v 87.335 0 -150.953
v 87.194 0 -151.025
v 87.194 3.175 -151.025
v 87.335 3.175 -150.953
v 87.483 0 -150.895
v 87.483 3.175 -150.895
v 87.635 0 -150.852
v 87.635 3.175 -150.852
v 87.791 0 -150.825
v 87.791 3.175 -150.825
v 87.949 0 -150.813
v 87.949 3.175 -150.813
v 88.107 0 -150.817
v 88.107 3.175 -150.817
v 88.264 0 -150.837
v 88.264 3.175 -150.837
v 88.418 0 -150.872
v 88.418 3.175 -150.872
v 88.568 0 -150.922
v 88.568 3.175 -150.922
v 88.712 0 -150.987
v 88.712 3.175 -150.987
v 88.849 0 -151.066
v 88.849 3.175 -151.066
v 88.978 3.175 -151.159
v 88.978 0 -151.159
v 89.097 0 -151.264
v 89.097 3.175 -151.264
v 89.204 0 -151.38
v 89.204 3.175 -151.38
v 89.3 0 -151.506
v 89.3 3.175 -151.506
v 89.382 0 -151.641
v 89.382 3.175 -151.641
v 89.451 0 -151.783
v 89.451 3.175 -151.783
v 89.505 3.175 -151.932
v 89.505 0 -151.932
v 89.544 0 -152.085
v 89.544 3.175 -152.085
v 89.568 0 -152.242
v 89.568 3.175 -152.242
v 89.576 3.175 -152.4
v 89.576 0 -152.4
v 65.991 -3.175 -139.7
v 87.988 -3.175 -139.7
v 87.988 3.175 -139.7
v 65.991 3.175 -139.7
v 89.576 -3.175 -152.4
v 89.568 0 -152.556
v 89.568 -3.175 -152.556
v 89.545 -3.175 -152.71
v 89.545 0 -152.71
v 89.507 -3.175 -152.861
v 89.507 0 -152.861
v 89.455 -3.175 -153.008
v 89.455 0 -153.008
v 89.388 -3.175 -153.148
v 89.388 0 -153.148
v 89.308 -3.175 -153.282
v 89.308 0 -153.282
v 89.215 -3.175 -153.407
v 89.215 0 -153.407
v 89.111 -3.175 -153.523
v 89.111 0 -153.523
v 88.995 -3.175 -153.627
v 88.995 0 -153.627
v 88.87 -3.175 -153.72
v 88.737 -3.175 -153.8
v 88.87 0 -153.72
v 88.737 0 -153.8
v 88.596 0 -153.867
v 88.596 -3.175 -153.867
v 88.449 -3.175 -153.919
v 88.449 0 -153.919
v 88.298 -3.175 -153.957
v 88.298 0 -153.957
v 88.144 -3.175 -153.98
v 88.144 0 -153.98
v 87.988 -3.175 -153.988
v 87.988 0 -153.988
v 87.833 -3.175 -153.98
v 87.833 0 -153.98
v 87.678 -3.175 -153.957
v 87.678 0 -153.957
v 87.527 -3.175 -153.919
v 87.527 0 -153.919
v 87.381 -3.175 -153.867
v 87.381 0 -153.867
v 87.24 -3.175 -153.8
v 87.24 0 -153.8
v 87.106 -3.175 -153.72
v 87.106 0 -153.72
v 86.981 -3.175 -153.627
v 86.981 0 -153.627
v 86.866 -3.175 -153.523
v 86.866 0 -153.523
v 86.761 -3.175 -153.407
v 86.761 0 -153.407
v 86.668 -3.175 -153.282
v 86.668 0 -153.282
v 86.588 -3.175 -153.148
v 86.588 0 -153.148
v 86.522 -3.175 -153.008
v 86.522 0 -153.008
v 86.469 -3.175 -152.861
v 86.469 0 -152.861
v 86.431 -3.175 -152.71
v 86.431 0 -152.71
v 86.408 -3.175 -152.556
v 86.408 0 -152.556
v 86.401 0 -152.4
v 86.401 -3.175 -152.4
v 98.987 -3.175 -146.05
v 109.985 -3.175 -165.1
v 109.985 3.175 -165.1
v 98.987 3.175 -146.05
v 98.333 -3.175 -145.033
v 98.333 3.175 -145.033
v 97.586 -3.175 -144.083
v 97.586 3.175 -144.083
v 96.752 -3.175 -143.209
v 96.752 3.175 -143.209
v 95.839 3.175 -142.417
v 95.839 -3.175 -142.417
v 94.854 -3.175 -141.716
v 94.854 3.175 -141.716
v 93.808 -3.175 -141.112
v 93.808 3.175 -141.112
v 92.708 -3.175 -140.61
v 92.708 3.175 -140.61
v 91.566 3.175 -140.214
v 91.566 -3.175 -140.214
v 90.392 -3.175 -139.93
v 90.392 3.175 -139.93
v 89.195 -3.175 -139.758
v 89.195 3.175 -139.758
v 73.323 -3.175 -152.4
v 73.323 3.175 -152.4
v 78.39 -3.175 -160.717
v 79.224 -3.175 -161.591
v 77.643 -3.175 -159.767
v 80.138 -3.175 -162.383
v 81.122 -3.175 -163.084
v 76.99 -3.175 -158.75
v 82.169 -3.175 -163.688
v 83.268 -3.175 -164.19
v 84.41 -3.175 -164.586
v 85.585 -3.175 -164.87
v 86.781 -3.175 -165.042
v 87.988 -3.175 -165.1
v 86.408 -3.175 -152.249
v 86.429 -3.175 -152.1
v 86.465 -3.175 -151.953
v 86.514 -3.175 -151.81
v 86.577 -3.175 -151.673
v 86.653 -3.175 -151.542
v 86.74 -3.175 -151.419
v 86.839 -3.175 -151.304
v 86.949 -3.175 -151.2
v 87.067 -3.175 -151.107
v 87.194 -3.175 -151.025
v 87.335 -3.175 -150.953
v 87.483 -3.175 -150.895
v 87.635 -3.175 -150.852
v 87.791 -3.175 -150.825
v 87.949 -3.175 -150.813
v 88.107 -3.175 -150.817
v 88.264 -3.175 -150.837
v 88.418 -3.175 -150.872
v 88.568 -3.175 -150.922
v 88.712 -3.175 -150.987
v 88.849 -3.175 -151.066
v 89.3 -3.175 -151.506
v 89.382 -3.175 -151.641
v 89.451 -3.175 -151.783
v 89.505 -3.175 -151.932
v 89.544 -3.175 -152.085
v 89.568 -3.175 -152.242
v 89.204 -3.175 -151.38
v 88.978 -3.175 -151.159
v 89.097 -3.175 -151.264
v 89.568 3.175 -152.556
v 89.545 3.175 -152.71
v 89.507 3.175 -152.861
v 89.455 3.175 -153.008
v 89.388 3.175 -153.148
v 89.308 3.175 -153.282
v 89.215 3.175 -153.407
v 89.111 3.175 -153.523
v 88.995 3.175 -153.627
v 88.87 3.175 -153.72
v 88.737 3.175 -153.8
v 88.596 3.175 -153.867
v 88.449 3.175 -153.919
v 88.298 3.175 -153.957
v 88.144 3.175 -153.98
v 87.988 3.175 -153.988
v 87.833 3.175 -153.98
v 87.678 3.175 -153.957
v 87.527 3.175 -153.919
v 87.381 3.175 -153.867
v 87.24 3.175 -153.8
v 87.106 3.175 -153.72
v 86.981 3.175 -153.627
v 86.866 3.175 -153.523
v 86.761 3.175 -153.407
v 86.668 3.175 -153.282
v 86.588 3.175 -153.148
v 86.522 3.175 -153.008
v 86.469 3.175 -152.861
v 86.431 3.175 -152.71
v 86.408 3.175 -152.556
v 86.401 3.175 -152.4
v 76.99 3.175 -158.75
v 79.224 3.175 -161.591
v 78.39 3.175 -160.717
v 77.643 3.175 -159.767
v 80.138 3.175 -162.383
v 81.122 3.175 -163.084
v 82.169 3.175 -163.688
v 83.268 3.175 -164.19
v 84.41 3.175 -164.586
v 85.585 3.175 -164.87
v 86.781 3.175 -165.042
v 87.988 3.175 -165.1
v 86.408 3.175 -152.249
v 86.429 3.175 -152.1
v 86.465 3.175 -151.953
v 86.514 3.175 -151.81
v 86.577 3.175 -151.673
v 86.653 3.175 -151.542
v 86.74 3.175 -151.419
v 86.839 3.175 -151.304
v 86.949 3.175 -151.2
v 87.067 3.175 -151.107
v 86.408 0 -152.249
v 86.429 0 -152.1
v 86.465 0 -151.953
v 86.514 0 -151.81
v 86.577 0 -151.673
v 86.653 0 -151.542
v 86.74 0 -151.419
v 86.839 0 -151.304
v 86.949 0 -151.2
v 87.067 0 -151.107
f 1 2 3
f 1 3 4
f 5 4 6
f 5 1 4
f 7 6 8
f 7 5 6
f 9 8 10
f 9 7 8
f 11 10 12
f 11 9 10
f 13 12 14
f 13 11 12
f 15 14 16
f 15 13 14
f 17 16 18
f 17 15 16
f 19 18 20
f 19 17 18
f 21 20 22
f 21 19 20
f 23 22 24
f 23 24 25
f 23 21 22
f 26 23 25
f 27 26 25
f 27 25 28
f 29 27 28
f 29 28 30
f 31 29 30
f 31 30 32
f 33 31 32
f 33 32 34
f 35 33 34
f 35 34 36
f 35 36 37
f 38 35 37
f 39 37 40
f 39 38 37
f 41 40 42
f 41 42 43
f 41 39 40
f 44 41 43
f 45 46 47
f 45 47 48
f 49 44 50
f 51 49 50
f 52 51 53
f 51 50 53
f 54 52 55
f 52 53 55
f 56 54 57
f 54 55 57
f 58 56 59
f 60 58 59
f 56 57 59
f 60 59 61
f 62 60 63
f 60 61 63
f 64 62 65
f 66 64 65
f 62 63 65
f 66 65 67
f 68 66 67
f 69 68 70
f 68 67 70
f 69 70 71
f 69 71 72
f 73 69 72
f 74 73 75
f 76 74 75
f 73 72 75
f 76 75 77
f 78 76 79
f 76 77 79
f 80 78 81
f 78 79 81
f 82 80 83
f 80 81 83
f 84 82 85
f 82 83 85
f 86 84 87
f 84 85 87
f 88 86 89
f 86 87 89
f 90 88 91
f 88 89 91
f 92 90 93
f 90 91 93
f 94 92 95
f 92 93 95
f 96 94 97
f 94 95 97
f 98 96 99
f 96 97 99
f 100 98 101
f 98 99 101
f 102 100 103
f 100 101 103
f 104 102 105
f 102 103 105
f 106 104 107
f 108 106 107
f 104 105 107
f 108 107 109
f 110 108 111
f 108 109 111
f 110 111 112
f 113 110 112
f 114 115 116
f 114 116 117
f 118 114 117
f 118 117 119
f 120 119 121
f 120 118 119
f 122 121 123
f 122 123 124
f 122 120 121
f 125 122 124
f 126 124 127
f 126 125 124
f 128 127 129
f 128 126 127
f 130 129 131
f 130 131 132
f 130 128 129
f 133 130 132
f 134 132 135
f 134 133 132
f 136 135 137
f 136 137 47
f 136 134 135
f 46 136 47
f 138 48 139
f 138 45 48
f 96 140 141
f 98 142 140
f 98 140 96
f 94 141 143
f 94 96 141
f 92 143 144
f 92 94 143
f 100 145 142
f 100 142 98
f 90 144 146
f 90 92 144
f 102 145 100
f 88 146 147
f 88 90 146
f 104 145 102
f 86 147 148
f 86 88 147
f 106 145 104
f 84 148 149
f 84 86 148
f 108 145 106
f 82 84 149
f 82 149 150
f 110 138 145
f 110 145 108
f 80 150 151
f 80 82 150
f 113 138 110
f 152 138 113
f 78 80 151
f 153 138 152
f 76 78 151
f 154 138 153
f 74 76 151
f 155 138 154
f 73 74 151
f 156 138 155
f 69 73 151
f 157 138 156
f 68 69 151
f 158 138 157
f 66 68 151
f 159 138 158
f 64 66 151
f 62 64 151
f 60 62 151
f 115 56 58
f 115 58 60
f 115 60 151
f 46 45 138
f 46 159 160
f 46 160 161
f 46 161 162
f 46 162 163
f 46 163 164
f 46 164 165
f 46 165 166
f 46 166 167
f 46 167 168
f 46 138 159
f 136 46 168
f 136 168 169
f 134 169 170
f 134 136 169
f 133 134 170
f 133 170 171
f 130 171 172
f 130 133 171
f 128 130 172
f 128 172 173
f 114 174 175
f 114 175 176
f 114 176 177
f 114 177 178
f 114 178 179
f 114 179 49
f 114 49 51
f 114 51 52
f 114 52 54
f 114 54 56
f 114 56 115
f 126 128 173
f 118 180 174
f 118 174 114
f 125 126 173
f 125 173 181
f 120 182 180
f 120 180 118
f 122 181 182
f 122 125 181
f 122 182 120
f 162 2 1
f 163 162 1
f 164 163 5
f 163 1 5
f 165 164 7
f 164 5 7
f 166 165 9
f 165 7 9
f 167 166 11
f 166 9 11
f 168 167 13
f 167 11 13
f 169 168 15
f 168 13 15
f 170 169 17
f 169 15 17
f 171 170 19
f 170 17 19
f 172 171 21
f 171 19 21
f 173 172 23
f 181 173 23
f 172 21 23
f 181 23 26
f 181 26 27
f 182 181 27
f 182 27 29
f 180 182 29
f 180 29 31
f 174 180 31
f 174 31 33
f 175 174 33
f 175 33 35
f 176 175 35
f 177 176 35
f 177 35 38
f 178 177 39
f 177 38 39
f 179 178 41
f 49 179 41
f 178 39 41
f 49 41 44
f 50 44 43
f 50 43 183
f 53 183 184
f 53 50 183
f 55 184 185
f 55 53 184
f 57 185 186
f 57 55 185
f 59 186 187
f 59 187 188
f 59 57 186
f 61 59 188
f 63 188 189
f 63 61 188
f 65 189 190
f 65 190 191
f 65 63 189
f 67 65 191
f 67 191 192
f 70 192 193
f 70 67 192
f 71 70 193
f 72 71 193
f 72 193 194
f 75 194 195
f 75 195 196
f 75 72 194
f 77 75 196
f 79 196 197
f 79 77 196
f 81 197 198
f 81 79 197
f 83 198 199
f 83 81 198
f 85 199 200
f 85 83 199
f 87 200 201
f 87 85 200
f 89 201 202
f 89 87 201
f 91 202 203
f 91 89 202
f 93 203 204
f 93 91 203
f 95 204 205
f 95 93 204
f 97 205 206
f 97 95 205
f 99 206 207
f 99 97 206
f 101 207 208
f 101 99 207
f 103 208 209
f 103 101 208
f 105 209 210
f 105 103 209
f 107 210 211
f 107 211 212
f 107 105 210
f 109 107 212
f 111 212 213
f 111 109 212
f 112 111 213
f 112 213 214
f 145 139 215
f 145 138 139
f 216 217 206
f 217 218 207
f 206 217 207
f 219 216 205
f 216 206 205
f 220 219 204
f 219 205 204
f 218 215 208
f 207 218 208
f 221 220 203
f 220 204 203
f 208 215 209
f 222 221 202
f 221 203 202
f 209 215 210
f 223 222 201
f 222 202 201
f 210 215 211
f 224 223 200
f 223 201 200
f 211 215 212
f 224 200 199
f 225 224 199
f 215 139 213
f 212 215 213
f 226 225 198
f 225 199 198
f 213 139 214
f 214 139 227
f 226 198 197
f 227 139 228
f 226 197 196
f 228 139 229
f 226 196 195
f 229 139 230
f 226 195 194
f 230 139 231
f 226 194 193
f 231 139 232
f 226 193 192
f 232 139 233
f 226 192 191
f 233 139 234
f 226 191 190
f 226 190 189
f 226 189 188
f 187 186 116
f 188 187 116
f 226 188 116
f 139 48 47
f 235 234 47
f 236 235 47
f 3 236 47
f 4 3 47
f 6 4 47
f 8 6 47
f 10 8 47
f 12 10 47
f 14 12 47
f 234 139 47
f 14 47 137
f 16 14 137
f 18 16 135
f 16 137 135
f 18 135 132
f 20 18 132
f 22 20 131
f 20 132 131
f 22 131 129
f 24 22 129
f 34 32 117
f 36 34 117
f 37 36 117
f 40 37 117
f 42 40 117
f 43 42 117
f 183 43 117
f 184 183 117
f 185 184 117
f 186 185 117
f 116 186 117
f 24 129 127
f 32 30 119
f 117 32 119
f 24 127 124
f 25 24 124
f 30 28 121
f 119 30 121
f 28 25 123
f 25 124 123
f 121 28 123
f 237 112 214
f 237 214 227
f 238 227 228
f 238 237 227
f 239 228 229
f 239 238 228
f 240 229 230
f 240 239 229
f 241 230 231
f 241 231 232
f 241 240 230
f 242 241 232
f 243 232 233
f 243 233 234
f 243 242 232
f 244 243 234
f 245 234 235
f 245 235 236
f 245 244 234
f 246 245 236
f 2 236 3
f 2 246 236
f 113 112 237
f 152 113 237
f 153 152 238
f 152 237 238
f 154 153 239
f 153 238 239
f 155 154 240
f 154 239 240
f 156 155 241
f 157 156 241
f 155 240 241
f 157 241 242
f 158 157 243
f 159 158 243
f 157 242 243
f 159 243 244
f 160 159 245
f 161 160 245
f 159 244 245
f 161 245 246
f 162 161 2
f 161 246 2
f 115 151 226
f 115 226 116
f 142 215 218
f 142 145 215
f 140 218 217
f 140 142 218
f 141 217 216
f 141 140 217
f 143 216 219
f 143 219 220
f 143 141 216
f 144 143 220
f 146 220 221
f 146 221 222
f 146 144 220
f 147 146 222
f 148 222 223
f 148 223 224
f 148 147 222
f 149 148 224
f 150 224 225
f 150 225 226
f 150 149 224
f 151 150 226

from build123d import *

# Parameters (mm, degrees)
F1_DEPTH = 3.175


with BuildPart() as f1:
    # F0 (on Front) → F1 (new body, symmetric)
    with BuildSketch(Plane.XZ):
        with BuildLine():
            ThreePointArc((81.6381810245, -141.4014773719), (76.9896583964, -146.05), (75.2881810245, -152.4))
            Line((75.2881810245, -152.4), (86.4006810245, -152.4))
            ThreePointArc((86.4006810245, -152.4), (86.613365696, -151.60625), (87.1944310245, -151.0251846715))
            Line((87.1944310245, -151.0251846715), (81.6381810245, -141.4014773719))
        make_face()
        with BuildLine():
            ThreePointArc((76.9896583964, -158.75), (81.6381810245, -163.3985226281), (87.9881810245, -165.1))
            ThreePointArc((87.9881810245, -165.1), (96.9684371456, -161.3802561211), (100.6881810245, -152.4))
            ThreePointArc((100.6881810245, -152.4), (100.2554390184, -149.1129981272), (98.9867036526, -146.05))
            ThreePointArc((98.9867036526, -146.05), (94.3381810245, -141.4014773719), (87.9881810245, -139.7))
            ThreePointArc((87.9881810245, -139.7), (84.7011791517, -140.1327420061), (81.6381810245, -141.4014773719))
            Line((81.6381810245, -141.4014773719), (87.1944310245, -151.0251846715))
            ThreePointArc((87.1944310245, -151.0251846715), (88.7819310245, -151.0251846715), (89.5756810245, -152.4))
            ThreePointArc((89.5756810245, -152.4), (87.9881810245, -153.9875), (86.4006810245, -152.4))
            Line((86.4006810245, -152.4), (75.2881810245, -152.4))
            ThreePointArc((75.2881810245, -152.4), (75.7209230306, -155.6870018728), (76.9896583964, -158.75))
        make_face()
        with BuildLine():
            Line((87.9881810245, -139.7), (80.6558326058, -139.7))
            Line((80.6558326058, -139.7), (81.6381810245, -141.4014773719))
            ThreePointArc((81.6381810245, -141.4014773719), (84.7011791517, -140.1327420061), (87.9881810245, -139.7))
        make_face()
        with BuildLine():
            Line((80.6558326058, -139.7), (65.9911357684, -139.7))
            Line((65.9911357684, -139.7), (73.3234841871, -152.4))
            Line((73.3234841871, -152.4), (75.2881810245, -152.4))
            ThreePointArc((75.2881810245, -152.4), (76.9896583964, -146.05), (81.6381810245, -141.4014773719))
            Line((81.6381810245, -141.4014773719), (80.6558326058, -139.7))
        make_face()
        with BuildLine():
            Line((75.2881810245, -152.4), (73.3234841871, -152.4))
            Line((73.3234841871, -152.4), (76.9896583964, -158.75))
            ThreePointArc((76.9896583964, -158.75), (75.7209230306, -155.6870018728), (75.2881810245, -152.4))
        make_face()
        with BuildLine():
            ThreePointArc((100.6881810245, -152.4), (96.9684371456, -161.3802561211), (87.9881810245, -165.1))
            Line((87.9881810245, -165.1), (109.9852262806, -165.1))
            Line((109.9852262806, -165.1), (98.9867036526, -146.05))
            ThreePointArc((98.9867036526, -146.05), (100.2554390184, -149.1129981272), (100.6881810245, -152.4))
        make_face()
    extrude(amount=F1_DEPTH, both=True)


solid = f1.part
